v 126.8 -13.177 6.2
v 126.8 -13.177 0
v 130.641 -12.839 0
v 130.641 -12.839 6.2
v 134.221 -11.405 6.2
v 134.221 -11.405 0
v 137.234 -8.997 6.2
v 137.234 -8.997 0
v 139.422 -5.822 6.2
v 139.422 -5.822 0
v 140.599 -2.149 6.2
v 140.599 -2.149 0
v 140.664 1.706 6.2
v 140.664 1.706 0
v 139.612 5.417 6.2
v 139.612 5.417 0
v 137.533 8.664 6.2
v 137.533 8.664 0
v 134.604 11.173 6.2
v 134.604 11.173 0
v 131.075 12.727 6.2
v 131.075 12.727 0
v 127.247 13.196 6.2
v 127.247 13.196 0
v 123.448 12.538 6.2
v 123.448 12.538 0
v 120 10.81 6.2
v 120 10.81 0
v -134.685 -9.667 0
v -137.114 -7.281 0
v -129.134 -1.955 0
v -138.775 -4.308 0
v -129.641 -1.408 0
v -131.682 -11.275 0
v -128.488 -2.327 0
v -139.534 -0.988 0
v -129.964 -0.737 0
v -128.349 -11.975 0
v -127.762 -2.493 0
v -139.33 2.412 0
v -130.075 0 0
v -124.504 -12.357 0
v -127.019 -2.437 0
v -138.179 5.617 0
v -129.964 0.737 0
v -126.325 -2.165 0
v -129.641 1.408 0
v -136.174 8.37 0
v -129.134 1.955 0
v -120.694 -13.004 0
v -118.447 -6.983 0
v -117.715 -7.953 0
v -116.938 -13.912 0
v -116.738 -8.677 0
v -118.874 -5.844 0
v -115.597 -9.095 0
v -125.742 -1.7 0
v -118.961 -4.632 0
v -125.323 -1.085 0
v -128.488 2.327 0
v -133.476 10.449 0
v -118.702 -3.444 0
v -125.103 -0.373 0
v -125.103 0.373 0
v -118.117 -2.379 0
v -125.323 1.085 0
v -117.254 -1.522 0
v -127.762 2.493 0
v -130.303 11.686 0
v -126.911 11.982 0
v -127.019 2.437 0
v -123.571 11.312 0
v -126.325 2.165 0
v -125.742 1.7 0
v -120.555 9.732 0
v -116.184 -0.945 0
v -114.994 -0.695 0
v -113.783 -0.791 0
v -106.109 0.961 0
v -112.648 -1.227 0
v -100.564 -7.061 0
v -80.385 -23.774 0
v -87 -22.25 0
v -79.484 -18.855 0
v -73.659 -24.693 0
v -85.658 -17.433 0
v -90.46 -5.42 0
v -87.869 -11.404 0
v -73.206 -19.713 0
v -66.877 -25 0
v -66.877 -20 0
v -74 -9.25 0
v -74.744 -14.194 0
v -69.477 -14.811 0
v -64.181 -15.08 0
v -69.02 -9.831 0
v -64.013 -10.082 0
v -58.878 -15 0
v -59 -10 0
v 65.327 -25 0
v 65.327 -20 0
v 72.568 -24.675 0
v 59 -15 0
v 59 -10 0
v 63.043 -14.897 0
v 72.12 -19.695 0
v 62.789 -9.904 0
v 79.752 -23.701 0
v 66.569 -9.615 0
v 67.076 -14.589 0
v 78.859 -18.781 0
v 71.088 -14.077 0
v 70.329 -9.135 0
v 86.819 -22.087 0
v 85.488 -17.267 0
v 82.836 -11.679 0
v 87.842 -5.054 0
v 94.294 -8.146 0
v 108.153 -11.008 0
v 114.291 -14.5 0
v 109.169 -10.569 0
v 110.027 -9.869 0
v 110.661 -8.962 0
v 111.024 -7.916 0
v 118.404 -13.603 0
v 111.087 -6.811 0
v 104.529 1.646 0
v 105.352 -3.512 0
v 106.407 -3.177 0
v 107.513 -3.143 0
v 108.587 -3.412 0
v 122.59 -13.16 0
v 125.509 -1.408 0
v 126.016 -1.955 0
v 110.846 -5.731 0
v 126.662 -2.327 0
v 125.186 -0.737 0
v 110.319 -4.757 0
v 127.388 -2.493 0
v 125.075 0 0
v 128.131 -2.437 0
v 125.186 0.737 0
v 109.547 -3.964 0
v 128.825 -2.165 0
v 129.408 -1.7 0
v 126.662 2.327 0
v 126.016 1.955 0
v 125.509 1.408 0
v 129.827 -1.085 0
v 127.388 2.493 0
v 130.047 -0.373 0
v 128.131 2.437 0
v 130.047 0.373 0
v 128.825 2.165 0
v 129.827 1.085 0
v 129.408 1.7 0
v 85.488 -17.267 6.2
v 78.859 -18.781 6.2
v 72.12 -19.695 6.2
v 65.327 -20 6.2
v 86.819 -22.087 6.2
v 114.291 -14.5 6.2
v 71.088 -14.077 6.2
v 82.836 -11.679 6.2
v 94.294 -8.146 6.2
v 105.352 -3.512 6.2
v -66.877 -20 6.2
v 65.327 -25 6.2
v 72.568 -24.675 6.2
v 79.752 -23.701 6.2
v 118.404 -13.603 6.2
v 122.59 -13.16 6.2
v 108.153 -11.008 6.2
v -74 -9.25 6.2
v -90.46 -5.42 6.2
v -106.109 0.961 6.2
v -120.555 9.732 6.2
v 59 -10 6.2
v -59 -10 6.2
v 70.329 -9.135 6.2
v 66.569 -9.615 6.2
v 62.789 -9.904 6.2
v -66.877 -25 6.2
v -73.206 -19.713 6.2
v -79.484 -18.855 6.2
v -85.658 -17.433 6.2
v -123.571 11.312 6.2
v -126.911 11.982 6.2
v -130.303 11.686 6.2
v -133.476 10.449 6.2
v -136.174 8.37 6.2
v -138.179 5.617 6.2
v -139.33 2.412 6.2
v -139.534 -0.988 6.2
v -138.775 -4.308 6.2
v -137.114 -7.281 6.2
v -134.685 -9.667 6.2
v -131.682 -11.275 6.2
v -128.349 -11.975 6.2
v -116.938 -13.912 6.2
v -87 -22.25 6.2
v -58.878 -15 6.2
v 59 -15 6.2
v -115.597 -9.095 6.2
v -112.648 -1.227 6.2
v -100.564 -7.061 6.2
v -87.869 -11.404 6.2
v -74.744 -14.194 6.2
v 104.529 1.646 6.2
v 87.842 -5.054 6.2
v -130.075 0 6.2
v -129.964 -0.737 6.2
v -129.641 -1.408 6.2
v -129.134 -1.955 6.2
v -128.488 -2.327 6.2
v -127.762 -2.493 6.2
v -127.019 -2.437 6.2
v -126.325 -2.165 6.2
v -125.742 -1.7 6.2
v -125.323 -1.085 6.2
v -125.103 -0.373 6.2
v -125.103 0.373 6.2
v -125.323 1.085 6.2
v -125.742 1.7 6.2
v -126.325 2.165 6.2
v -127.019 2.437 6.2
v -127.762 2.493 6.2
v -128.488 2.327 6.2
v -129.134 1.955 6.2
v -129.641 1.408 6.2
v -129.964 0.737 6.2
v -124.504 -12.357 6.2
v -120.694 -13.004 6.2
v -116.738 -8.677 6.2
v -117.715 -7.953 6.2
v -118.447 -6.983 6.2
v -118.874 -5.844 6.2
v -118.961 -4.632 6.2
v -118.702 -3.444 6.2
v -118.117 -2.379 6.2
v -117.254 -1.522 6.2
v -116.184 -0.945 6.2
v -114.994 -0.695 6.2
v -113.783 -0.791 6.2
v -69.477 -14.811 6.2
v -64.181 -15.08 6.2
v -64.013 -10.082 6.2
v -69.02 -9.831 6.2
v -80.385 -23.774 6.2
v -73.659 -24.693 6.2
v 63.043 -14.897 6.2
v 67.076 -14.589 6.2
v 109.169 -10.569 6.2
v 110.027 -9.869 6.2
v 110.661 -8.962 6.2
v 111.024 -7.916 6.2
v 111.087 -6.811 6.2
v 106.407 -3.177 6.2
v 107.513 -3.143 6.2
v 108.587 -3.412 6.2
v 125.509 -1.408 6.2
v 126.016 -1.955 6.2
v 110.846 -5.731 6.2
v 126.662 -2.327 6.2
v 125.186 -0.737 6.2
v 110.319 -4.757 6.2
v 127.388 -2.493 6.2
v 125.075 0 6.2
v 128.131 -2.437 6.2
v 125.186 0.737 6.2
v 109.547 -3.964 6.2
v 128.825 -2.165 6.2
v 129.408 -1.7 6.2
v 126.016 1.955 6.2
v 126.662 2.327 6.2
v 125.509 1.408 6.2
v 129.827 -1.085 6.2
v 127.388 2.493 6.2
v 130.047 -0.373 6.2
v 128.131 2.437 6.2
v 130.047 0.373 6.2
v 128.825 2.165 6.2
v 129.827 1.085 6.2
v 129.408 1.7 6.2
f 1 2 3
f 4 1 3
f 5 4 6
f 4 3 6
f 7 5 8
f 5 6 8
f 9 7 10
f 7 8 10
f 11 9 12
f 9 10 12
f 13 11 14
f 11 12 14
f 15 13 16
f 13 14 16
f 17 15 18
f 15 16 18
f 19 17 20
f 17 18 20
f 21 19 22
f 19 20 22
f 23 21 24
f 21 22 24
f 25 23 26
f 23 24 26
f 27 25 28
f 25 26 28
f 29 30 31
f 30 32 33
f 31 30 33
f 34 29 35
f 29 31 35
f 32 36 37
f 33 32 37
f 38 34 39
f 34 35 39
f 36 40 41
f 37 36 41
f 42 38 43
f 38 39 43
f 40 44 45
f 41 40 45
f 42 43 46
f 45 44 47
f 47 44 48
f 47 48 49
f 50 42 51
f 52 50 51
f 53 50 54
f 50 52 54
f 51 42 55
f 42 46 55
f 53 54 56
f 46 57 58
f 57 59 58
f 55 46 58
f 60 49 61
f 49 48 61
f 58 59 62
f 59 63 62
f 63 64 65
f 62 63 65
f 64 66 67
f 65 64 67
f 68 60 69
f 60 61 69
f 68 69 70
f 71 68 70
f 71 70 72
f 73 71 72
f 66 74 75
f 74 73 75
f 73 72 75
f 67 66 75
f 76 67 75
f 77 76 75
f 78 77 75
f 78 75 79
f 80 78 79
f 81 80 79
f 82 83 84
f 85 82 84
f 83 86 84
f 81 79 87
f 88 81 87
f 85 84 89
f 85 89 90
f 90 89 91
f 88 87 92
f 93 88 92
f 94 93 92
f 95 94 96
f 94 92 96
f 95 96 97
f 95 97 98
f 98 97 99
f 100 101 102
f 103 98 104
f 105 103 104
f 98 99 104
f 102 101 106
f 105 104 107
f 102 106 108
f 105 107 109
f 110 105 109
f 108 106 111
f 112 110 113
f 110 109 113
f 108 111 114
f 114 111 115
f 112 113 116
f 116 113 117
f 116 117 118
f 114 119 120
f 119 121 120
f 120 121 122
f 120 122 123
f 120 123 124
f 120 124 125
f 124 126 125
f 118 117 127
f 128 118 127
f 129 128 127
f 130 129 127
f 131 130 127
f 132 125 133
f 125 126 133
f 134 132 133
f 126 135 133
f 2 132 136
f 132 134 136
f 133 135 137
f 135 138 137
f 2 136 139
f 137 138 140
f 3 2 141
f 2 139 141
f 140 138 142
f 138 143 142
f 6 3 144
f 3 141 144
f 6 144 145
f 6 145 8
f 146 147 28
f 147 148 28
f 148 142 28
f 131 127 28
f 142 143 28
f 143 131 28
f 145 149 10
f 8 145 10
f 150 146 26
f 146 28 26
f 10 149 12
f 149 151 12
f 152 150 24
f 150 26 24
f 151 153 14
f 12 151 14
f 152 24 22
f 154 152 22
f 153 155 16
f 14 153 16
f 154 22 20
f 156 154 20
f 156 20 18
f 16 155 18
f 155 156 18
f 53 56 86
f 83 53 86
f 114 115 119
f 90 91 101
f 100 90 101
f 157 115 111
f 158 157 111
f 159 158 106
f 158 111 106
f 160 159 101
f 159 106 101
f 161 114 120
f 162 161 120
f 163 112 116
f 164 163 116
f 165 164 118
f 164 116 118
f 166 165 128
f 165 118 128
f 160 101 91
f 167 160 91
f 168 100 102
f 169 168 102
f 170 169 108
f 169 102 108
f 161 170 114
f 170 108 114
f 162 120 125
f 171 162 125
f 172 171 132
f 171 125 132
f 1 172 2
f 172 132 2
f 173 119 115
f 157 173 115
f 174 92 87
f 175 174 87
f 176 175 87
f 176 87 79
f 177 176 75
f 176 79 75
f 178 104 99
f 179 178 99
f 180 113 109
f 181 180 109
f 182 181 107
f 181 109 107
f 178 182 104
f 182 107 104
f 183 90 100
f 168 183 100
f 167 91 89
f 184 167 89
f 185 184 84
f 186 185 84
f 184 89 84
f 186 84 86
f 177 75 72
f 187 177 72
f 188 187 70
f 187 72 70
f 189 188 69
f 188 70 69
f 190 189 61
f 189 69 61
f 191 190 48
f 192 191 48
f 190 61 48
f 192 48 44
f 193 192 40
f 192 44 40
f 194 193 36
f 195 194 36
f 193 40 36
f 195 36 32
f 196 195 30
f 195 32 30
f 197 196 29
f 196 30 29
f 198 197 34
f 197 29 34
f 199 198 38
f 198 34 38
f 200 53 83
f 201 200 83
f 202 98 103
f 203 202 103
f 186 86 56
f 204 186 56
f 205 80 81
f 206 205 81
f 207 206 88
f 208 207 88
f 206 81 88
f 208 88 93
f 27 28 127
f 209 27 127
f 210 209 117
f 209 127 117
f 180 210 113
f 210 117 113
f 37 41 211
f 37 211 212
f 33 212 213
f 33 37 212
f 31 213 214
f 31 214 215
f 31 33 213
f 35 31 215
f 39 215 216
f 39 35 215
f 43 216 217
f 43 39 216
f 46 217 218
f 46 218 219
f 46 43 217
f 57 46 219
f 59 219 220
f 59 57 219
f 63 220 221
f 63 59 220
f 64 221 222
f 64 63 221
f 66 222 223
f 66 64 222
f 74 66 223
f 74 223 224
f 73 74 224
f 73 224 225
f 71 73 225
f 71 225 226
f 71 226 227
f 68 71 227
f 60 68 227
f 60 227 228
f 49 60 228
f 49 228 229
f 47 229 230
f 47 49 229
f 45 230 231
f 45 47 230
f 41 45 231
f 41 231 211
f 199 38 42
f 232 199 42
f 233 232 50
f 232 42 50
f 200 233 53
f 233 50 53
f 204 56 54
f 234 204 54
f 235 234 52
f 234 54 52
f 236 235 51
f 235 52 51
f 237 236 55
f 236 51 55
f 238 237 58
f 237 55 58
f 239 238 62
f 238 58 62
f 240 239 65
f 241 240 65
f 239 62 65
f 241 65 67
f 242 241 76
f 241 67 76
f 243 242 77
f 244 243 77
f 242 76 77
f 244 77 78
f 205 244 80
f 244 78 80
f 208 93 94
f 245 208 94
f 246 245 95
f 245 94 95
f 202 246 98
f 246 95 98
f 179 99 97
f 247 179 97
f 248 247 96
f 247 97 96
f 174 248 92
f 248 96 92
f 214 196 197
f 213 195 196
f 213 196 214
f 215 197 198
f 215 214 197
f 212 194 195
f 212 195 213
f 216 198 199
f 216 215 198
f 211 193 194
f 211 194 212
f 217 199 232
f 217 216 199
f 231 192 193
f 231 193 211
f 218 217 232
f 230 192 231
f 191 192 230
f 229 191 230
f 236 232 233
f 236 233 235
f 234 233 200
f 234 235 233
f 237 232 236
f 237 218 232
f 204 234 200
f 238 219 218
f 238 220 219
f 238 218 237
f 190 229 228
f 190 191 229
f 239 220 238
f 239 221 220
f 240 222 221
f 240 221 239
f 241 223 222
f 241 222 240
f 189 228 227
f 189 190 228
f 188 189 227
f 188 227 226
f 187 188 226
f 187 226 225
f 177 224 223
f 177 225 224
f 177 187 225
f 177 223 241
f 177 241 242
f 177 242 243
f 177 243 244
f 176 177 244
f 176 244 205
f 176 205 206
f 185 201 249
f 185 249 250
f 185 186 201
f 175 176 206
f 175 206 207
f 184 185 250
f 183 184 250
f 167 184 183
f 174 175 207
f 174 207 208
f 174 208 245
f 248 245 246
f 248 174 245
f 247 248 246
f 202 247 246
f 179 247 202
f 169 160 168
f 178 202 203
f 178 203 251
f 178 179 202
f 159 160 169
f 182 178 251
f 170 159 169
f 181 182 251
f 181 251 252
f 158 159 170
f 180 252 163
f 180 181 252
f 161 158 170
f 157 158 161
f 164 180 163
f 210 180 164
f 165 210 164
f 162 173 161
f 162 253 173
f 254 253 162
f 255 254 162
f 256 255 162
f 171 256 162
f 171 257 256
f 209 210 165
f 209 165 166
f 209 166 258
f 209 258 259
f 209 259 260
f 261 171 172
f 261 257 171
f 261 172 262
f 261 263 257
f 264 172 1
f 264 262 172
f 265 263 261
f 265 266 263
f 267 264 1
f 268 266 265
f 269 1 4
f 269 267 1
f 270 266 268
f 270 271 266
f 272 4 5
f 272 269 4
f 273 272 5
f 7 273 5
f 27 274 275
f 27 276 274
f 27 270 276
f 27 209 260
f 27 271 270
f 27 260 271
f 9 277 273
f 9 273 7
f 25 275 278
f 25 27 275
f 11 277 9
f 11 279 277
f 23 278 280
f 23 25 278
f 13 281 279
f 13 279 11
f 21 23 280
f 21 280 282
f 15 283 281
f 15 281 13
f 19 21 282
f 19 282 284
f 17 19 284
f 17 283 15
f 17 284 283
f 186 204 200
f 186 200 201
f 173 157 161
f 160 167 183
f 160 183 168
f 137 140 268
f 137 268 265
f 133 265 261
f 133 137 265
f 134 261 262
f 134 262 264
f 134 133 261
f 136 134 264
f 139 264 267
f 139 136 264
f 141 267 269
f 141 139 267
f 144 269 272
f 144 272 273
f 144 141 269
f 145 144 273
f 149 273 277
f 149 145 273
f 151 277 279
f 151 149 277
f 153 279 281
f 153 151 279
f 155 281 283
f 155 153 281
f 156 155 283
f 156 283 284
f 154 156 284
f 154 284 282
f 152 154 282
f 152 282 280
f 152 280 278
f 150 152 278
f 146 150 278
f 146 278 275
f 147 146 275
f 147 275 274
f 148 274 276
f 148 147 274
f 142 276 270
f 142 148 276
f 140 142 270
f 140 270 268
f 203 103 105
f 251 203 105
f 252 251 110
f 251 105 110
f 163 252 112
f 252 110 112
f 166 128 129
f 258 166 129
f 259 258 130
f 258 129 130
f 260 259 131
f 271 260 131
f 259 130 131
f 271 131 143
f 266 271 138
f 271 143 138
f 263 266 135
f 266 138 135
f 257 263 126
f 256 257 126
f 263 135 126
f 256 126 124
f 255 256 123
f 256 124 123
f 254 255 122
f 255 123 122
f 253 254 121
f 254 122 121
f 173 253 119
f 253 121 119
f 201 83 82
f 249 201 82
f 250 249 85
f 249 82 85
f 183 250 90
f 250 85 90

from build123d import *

# Parameters (mm, degrees)
SKETCH1_R           = 2.5
BOSS_EXTRUDE1_DEPTH = 6.2


with BuildPart() as part:
    # Sketch1 → Boss-Extrude1 (new body)
    with BuildSketch(Plane.XY):
        with BuildLine():
            ThreePointArc((-128.349445963, -11.974982784), (-122.593742509, -12.647675527), (-116.938372425, -13.911569107))
            Line((-116.938372425, -13.911569107), (-87, -22.25))
            ThreePointArc((-87, -22.25), (-77.031989093, -24.309319739), (-66.876941087, -25))
            Line((-66.876941087, -25), (65.326528755, -25))
            ThreePointArc((65.326528755, -25), (76.171142315, -24.268371831), (86.819214247, -22.086746937))
            Line((86.819214247, -22.086746937), (114.2908591, -14.5))
            ThreePointArc((114.2908591, -14.5), (120.491041615, -13.324280476), (126.8, -13.177230394))
            ThreePointArc((126.8, -13.177230394), (140.274563377, 3.600104754), (120, 10.810161116))
            ThreePointArc((120, 10.810161116), (96.313236011, -2.023267975), (70.328890052, -9.134769615))
            ThreePointArc((70.328890052, -9.134769615), (64.680941239, -9.783377892), (59, -10))
            Line((59, -10), (-59, -10))
            ThreePointArc((-59, -10), (-66.518658645, -9.998172905), (-74, -9.25))
            ThreePointArc((-74, -9.25), (-98.410939741, -2.539404949), (-120.554503776, 9.732051233))
            ThreePointArc((-120.554503776, 9.732051233), (-138.868880222, 4.055609252), (-128.349445963, -11.974982784))
        make_face()
        with BuildLine():
            Line((-85.658462739, -17.433333333), (-115.596835164, -9.09490244))
            ThreePointArc((-115.596835164, -9.09490244), (-118.701610917, -3.444269215), (-112.647605232, -1.22654437))
            ThreePointArc((-112.647605232, -1.22654437), (-94.281848906, -9.423130627), (-74.744170673, -14.194310873))
            ThreePointArc((-74.744170673, -14.194310873), (-66.831109196, -14.988771962), (-58.878274211, -15))
            Line((-58.878274211, -15), (59, -15))
            ThreePointArc((59, -15), (65.061701375, -14.768858984), (71.088199037, -14.076778302))
            ThreePointArc((71.088199037, -14.076778302), (88.608020432, -10.052780957), (105.35190821, -3.512221467))
            ThreePointArc((105.35190821, -3.512221467), (110.845938526, -5.730539831), (108.152661113, -11.007997765))
            Line((108.152661113, -11.007997765), (85.488206013, -17.26716012))
            ThreePointArc((85.488206013, -17.26716012), (75.499552441, -19.313680413), (65.326528755, -20))
            Line((65.326528755, -20), (-66.876941087, -20))
            ThreePointArc((-66.876941087, -20), (-76.354985893, -19.355365089), (-85.658462739, -17.433333333))
        make_face(mode=Mode.SUBTRACT)
        with Locations(Location((-127.574986581, 0, 0), (0, 0, 180))):
            Circle(SKETCH1_R, mode=Mode.SUBTRACT)
        with Locations(Location((127.574986581, 0, 0), (0, 0, 180))):
            Circle(SKETCH1_R, mode=Mode.SUBTRACT)
    extrude(amount=BOSS_EXTRUDE1_DEPTH)


solid = part.part
